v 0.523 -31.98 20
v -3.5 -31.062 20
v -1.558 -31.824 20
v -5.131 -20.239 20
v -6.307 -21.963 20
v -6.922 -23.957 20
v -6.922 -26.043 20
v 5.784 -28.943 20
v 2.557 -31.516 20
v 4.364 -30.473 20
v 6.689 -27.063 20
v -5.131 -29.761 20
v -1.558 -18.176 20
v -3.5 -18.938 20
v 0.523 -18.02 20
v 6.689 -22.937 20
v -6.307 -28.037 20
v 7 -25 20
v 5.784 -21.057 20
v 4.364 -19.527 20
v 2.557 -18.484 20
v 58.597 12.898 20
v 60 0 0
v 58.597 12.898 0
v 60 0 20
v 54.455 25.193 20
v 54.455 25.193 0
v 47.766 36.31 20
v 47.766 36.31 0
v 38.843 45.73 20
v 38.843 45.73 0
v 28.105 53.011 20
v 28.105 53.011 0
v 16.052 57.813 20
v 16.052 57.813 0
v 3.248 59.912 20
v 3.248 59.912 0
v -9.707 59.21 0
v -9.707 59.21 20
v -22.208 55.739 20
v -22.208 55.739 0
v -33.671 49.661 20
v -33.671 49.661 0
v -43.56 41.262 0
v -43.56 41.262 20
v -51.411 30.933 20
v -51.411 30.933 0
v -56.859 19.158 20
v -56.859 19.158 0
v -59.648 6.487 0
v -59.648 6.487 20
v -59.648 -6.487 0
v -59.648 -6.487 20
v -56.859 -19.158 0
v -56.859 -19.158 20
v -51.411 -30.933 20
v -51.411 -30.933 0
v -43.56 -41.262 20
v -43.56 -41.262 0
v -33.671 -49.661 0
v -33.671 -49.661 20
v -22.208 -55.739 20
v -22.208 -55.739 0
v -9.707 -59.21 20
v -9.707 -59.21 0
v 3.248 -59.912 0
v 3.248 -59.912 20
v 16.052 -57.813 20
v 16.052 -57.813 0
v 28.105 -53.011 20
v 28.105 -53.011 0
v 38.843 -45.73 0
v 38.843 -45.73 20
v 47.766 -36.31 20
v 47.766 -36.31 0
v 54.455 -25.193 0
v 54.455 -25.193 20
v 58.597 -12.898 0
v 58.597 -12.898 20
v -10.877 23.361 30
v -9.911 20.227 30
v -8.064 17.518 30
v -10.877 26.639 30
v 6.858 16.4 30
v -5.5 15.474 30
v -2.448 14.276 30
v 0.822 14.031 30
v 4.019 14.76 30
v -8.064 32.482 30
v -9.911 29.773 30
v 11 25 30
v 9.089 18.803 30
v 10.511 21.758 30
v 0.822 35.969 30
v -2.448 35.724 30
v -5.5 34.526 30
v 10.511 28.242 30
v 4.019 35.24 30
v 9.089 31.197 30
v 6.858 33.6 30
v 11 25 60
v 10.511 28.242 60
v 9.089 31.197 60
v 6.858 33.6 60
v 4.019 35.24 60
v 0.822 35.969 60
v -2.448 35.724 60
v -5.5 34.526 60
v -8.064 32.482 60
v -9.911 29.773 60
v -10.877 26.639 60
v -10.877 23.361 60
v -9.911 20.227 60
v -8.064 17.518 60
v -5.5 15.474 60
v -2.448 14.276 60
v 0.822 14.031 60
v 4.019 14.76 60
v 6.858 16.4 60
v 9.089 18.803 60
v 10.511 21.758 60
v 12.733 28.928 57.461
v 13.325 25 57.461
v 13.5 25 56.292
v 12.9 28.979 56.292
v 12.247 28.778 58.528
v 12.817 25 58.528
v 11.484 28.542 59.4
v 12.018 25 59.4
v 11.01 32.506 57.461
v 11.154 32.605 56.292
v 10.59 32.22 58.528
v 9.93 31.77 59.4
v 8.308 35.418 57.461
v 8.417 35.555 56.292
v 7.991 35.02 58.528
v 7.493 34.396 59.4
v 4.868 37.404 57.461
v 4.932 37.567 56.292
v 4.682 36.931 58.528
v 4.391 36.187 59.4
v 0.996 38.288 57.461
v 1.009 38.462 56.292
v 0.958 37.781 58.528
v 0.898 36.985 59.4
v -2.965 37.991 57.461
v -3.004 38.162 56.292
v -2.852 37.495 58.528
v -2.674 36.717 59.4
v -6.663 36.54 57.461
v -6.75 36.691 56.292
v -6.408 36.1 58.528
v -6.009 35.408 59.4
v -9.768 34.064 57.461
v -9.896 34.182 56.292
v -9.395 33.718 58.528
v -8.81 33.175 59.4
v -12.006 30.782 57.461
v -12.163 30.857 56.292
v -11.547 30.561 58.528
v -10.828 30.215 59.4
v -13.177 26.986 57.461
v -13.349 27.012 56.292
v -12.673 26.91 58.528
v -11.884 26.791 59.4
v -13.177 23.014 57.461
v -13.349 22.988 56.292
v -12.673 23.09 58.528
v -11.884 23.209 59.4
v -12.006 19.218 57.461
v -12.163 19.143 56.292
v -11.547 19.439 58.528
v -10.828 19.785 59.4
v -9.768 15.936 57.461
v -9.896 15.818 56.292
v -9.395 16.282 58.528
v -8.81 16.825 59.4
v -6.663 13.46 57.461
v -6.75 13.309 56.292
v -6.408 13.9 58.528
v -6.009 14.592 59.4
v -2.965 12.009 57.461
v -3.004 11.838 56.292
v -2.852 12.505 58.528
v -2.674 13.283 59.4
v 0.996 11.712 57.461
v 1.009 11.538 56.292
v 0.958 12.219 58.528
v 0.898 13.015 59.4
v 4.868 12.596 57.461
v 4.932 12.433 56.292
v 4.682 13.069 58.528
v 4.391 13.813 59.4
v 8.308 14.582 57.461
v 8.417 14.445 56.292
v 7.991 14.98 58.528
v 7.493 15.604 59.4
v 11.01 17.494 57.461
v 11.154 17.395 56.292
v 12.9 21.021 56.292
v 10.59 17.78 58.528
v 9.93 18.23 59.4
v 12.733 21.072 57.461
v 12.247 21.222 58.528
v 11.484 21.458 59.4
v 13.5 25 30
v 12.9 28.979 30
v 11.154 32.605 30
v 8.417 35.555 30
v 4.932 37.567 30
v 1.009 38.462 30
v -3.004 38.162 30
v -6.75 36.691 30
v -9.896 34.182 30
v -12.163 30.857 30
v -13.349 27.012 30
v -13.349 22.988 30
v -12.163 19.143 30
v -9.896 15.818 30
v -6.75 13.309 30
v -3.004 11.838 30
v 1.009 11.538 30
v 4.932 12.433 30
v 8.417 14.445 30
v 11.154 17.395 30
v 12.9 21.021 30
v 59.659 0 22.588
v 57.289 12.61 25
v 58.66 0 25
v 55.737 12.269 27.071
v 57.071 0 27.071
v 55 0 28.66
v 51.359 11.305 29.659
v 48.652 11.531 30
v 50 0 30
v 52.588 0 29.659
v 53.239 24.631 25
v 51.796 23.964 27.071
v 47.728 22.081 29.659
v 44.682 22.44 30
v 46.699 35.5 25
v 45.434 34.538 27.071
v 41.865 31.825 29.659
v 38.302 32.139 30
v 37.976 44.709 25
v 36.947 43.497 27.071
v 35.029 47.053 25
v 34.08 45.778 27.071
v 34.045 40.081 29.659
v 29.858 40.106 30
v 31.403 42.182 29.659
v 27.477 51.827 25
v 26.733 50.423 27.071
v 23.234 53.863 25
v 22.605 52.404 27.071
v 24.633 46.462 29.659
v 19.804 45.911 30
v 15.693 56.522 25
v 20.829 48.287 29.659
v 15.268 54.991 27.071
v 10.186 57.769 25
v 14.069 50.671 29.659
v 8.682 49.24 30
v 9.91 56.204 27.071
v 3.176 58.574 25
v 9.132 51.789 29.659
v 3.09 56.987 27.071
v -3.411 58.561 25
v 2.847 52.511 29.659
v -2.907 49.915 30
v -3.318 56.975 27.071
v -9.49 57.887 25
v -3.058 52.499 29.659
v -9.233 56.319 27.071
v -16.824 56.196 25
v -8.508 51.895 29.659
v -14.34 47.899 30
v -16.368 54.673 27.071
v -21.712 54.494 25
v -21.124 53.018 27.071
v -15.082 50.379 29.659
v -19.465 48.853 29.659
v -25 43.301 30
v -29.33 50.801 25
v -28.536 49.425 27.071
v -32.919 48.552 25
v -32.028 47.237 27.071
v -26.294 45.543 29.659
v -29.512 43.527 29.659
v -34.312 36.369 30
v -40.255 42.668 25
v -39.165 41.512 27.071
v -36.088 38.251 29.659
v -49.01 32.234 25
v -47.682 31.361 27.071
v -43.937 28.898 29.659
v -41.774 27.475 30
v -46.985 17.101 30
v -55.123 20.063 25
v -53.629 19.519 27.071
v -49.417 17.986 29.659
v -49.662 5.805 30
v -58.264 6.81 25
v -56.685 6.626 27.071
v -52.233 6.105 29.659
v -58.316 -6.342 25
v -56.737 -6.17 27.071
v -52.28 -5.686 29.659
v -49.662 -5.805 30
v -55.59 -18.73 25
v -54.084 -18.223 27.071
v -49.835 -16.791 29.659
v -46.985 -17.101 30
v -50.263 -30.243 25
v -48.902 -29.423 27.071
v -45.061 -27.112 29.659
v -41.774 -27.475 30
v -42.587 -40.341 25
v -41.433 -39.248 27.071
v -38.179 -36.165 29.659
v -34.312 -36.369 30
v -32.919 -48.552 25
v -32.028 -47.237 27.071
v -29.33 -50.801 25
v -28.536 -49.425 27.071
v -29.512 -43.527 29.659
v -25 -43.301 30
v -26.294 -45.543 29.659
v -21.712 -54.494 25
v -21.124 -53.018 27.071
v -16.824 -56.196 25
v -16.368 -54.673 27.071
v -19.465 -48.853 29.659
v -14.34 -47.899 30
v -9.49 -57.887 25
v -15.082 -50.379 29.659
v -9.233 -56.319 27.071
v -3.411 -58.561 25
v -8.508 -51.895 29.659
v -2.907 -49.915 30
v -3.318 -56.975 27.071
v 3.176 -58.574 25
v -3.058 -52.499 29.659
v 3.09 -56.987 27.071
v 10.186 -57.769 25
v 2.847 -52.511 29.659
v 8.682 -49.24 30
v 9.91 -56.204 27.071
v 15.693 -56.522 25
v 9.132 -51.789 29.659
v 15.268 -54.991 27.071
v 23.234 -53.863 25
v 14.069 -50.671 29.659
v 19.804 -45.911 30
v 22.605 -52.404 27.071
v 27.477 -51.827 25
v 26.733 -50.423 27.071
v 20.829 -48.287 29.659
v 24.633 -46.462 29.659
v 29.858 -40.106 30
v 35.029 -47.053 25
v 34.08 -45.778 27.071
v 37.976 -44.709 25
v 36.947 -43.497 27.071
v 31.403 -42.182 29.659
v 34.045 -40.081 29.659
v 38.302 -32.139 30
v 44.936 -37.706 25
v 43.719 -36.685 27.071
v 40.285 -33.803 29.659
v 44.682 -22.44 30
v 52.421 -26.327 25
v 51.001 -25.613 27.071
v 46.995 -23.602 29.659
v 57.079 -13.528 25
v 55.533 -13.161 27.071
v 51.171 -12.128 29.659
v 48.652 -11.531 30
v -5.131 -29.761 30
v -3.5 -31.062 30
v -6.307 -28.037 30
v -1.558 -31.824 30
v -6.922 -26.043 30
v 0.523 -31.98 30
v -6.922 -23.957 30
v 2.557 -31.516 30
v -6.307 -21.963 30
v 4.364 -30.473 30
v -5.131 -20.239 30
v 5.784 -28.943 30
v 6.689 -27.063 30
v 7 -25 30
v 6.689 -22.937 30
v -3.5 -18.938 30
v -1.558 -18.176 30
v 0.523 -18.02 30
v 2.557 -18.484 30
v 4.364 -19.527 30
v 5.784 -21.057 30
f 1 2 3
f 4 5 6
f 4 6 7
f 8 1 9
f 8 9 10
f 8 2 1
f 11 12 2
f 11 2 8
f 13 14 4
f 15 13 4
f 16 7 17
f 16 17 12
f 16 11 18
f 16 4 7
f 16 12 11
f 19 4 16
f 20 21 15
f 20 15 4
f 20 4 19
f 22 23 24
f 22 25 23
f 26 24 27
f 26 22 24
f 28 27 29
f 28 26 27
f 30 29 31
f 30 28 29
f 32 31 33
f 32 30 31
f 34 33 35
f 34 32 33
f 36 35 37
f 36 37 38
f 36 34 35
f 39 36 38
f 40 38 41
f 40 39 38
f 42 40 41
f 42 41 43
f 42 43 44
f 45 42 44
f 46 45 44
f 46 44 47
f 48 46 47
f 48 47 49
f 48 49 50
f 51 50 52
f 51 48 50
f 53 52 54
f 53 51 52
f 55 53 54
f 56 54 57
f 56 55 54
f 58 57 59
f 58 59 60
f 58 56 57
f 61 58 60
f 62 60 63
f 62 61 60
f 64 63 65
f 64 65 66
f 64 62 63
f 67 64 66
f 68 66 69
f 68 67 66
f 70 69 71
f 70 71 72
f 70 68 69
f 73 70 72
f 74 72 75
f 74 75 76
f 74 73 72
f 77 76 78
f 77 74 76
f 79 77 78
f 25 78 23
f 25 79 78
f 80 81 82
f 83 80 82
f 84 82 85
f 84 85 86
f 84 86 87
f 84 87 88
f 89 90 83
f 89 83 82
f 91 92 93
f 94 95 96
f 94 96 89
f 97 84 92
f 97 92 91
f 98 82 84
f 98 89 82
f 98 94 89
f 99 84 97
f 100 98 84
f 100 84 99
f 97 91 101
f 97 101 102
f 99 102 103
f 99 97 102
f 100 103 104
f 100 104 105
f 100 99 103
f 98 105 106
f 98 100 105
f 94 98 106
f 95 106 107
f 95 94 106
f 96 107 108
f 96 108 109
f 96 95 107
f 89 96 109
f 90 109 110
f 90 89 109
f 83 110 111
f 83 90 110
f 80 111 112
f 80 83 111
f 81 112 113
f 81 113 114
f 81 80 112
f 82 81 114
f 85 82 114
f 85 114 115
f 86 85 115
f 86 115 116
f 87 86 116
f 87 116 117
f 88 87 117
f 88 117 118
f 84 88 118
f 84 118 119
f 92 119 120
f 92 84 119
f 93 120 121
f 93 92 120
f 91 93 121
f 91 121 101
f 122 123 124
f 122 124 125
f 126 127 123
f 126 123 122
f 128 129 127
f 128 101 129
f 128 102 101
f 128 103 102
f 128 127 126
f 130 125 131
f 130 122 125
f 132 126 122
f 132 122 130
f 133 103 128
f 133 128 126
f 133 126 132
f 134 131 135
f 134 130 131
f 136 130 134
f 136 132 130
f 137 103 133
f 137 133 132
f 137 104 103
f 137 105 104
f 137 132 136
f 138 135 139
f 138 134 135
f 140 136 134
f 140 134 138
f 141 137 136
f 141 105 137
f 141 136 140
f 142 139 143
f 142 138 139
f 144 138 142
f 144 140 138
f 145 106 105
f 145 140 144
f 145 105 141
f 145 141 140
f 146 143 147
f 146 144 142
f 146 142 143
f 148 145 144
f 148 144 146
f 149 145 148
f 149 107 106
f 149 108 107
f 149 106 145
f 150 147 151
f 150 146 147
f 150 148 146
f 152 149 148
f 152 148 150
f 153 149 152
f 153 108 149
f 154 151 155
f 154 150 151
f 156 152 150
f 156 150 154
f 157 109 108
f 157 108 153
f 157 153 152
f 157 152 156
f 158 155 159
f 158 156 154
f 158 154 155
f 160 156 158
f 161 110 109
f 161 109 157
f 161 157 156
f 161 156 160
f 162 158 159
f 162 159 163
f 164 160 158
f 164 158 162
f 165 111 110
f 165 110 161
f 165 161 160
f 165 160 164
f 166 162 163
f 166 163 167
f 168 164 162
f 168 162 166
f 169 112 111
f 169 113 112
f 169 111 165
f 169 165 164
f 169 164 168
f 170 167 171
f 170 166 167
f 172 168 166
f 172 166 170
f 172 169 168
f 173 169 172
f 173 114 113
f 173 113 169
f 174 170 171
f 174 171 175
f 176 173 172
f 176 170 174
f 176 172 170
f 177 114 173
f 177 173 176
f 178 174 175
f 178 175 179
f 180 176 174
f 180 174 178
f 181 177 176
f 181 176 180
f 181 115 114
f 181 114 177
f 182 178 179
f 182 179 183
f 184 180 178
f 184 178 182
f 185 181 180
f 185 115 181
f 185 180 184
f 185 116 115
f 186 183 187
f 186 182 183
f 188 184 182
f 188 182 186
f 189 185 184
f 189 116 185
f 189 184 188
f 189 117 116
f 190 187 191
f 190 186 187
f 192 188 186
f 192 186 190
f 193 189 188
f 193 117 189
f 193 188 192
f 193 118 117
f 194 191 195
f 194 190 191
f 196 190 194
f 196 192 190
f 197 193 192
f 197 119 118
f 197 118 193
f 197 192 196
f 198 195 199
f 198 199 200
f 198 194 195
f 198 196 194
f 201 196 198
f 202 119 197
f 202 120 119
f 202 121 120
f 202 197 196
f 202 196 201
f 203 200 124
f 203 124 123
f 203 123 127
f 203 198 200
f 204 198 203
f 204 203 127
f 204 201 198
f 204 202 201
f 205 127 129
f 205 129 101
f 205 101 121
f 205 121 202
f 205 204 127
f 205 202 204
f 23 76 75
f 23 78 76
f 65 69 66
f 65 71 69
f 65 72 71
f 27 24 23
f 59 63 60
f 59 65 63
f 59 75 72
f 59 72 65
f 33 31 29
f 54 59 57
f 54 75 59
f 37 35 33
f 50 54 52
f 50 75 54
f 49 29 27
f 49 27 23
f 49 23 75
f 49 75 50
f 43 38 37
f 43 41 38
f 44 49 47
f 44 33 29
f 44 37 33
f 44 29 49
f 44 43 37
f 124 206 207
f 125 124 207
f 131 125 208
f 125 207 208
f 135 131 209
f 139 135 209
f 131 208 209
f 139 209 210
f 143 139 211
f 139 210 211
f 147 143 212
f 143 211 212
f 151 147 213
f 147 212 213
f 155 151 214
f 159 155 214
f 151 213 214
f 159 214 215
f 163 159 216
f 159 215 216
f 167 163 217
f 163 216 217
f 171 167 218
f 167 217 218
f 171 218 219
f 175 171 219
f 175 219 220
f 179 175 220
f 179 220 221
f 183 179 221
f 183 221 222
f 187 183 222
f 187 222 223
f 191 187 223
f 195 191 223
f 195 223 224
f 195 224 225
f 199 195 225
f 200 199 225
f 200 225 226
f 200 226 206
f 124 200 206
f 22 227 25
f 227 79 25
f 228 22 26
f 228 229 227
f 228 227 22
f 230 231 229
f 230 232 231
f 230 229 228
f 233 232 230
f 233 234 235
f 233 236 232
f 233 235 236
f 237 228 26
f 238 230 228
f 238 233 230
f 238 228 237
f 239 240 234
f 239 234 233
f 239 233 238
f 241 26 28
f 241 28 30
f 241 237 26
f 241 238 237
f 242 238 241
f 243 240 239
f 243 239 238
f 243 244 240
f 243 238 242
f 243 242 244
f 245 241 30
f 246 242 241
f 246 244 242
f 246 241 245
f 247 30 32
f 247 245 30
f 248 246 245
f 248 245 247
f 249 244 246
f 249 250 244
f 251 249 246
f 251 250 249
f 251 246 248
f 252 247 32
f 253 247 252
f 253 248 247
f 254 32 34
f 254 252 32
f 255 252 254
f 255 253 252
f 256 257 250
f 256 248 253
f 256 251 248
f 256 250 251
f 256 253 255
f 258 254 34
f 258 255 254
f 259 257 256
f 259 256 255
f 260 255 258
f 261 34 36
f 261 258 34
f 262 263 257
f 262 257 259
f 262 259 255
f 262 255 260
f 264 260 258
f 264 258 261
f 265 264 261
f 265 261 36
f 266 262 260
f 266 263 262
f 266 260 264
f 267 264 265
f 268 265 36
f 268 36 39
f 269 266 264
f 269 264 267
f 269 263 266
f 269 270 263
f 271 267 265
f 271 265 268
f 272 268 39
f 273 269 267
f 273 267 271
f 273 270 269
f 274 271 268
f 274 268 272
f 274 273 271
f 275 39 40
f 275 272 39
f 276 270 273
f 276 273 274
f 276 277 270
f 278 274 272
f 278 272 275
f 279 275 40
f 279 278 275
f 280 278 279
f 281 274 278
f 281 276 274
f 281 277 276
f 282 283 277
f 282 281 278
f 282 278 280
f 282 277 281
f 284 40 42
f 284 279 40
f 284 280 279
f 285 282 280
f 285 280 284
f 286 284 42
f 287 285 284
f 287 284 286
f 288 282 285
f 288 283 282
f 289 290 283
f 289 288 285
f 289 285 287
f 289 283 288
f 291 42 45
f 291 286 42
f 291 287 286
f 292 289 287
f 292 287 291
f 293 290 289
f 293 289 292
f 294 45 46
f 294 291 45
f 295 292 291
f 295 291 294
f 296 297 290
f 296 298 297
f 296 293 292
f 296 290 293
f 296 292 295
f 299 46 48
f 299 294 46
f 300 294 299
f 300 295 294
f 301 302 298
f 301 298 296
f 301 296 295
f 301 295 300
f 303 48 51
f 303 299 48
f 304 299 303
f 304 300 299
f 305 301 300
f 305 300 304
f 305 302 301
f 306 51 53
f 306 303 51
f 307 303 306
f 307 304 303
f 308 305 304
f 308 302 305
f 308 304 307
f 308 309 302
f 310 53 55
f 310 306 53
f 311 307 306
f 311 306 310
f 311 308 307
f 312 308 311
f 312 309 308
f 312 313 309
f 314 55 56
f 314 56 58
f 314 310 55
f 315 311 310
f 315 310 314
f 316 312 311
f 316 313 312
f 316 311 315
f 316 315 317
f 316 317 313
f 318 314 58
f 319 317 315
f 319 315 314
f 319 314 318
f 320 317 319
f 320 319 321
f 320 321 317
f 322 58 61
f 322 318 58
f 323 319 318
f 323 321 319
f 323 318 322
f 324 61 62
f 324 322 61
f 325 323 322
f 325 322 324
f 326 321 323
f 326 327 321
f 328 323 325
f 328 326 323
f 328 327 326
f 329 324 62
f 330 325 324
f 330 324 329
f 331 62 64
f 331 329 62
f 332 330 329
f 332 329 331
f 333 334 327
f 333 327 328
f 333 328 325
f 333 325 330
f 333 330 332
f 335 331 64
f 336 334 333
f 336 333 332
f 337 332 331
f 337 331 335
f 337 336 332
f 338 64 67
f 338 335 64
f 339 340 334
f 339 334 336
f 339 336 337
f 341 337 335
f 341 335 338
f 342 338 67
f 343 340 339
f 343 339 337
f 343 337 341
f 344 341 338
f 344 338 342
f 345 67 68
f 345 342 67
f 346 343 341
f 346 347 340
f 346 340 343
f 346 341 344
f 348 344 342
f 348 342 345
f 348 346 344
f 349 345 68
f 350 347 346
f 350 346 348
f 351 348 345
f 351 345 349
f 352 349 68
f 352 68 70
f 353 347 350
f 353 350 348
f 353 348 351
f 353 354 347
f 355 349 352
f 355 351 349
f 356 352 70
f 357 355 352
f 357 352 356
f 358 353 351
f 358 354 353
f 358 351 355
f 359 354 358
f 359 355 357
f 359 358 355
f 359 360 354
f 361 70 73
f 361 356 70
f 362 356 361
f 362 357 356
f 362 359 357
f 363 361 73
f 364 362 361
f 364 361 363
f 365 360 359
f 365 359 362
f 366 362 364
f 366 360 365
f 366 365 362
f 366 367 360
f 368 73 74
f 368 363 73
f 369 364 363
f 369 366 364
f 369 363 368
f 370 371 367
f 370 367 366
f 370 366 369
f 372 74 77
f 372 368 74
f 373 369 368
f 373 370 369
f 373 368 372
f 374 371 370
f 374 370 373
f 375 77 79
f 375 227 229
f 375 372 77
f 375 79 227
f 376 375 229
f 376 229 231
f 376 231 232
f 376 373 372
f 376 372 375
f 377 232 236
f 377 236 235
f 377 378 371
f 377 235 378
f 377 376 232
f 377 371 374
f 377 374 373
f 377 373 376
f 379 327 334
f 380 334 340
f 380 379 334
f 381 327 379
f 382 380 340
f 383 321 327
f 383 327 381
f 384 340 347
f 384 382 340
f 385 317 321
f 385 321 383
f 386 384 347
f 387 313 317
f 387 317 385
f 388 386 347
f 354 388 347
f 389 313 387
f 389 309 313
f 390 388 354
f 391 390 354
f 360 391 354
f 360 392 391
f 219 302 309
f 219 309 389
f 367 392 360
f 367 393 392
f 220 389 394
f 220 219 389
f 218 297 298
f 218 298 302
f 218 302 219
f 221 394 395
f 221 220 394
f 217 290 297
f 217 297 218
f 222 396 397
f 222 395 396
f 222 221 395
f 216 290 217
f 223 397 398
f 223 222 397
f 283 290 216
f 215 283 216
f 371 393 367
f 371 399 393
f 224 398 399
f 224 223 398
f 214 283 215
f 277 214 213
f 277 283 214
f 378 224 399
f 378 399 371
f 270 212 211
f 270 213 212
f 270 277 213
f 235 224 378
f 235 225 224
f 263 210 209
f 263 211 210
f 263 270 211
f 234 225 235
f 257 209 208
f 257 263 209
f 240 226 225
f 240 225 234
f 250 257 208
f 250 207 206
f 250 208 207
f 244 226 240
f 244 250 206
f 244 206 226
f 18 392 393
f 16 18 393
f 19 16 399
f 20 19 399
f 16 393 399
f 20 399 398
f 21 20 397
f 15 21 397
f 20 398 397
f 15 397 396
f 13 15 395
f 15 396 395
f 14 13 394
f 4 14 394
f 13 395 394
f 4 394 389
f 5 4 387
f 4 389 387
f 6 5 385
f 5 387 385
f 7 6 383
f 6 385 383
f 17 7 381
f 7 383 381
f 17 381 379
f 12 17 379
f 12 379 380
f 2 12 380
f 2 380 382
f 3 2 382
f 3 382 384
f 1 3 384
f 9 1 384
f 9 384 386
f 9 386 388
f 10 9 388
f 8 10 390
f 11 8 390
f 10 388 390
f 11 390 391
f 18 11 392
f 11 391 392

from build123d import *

# Parameters (mm, degrees)
F2_R     = 13.5
F2_R_2   = 11
F3_DEPTH = 30
F5_R     = 7
F6_DEPTH = 10


# Not quite as in the source:
# - a fillet or chamfer that OpenCascade refuses, or shapes differently, is made with other operations: its cross-section is extruded or revolved along the edge and cut away or added


with BuildPart() as f1:
    # F0 (on Front) → F1 (revolve)
    with BuildSketch(Plane.XZ):
        with BuildLine():
            Line((0, 30), (0, 0))
            Line((0, 0), (60, 0))
            Line((60, 0), (60, 20))
            ThreePointArc((60, 20), (57.0710678119, 27.0710678119), (50, 30))
            Line((50, 30), (0, 30))
        make_face()
    revolve(axis=Axis((0, 0, 15), (0, 0, 1)))

    # F2 (on face) → F3 (join)
    with BuildSketch(Plane.XY.offset(30)):
        with Locations((0, 25)):
            Circle(F2_R)
        with Locations((0, 25)):
            Circle(F2_R_2, mode=Mode.SUBTRACT)
    extrude(amount=F3_DEPTH)

    # F4: fillet of radius 4 on 1 edges, made by hand

    # F4_s1 → F4_t2 (revolve, cut)
    with BuildSketch(Plane.XZ.offset(-25)):
        with BuildLine():
            ThreePointArc((13.5, 56.2919007565), (12.8166247904, 58.527968734), (11, 60))
            Line((11, 60), (13.5, 60))
            Line((13.5, 60), (13.5, 56.2919007565))
        make_face()
    revolve(axis=Axis((0, 25, 60), (0, 0, 1)), mode=Mode.SUBTRACT)

    # F5 (on face) → F6 (cut)
    with BuildSketch(Plane.XY.offset(30)):
        with Locations((0, -25)):
            Circle(F5_R)
    extrude(amount=-F6_DEPTH, mode=Mode.SUBTRACT)


solid = f1.part
